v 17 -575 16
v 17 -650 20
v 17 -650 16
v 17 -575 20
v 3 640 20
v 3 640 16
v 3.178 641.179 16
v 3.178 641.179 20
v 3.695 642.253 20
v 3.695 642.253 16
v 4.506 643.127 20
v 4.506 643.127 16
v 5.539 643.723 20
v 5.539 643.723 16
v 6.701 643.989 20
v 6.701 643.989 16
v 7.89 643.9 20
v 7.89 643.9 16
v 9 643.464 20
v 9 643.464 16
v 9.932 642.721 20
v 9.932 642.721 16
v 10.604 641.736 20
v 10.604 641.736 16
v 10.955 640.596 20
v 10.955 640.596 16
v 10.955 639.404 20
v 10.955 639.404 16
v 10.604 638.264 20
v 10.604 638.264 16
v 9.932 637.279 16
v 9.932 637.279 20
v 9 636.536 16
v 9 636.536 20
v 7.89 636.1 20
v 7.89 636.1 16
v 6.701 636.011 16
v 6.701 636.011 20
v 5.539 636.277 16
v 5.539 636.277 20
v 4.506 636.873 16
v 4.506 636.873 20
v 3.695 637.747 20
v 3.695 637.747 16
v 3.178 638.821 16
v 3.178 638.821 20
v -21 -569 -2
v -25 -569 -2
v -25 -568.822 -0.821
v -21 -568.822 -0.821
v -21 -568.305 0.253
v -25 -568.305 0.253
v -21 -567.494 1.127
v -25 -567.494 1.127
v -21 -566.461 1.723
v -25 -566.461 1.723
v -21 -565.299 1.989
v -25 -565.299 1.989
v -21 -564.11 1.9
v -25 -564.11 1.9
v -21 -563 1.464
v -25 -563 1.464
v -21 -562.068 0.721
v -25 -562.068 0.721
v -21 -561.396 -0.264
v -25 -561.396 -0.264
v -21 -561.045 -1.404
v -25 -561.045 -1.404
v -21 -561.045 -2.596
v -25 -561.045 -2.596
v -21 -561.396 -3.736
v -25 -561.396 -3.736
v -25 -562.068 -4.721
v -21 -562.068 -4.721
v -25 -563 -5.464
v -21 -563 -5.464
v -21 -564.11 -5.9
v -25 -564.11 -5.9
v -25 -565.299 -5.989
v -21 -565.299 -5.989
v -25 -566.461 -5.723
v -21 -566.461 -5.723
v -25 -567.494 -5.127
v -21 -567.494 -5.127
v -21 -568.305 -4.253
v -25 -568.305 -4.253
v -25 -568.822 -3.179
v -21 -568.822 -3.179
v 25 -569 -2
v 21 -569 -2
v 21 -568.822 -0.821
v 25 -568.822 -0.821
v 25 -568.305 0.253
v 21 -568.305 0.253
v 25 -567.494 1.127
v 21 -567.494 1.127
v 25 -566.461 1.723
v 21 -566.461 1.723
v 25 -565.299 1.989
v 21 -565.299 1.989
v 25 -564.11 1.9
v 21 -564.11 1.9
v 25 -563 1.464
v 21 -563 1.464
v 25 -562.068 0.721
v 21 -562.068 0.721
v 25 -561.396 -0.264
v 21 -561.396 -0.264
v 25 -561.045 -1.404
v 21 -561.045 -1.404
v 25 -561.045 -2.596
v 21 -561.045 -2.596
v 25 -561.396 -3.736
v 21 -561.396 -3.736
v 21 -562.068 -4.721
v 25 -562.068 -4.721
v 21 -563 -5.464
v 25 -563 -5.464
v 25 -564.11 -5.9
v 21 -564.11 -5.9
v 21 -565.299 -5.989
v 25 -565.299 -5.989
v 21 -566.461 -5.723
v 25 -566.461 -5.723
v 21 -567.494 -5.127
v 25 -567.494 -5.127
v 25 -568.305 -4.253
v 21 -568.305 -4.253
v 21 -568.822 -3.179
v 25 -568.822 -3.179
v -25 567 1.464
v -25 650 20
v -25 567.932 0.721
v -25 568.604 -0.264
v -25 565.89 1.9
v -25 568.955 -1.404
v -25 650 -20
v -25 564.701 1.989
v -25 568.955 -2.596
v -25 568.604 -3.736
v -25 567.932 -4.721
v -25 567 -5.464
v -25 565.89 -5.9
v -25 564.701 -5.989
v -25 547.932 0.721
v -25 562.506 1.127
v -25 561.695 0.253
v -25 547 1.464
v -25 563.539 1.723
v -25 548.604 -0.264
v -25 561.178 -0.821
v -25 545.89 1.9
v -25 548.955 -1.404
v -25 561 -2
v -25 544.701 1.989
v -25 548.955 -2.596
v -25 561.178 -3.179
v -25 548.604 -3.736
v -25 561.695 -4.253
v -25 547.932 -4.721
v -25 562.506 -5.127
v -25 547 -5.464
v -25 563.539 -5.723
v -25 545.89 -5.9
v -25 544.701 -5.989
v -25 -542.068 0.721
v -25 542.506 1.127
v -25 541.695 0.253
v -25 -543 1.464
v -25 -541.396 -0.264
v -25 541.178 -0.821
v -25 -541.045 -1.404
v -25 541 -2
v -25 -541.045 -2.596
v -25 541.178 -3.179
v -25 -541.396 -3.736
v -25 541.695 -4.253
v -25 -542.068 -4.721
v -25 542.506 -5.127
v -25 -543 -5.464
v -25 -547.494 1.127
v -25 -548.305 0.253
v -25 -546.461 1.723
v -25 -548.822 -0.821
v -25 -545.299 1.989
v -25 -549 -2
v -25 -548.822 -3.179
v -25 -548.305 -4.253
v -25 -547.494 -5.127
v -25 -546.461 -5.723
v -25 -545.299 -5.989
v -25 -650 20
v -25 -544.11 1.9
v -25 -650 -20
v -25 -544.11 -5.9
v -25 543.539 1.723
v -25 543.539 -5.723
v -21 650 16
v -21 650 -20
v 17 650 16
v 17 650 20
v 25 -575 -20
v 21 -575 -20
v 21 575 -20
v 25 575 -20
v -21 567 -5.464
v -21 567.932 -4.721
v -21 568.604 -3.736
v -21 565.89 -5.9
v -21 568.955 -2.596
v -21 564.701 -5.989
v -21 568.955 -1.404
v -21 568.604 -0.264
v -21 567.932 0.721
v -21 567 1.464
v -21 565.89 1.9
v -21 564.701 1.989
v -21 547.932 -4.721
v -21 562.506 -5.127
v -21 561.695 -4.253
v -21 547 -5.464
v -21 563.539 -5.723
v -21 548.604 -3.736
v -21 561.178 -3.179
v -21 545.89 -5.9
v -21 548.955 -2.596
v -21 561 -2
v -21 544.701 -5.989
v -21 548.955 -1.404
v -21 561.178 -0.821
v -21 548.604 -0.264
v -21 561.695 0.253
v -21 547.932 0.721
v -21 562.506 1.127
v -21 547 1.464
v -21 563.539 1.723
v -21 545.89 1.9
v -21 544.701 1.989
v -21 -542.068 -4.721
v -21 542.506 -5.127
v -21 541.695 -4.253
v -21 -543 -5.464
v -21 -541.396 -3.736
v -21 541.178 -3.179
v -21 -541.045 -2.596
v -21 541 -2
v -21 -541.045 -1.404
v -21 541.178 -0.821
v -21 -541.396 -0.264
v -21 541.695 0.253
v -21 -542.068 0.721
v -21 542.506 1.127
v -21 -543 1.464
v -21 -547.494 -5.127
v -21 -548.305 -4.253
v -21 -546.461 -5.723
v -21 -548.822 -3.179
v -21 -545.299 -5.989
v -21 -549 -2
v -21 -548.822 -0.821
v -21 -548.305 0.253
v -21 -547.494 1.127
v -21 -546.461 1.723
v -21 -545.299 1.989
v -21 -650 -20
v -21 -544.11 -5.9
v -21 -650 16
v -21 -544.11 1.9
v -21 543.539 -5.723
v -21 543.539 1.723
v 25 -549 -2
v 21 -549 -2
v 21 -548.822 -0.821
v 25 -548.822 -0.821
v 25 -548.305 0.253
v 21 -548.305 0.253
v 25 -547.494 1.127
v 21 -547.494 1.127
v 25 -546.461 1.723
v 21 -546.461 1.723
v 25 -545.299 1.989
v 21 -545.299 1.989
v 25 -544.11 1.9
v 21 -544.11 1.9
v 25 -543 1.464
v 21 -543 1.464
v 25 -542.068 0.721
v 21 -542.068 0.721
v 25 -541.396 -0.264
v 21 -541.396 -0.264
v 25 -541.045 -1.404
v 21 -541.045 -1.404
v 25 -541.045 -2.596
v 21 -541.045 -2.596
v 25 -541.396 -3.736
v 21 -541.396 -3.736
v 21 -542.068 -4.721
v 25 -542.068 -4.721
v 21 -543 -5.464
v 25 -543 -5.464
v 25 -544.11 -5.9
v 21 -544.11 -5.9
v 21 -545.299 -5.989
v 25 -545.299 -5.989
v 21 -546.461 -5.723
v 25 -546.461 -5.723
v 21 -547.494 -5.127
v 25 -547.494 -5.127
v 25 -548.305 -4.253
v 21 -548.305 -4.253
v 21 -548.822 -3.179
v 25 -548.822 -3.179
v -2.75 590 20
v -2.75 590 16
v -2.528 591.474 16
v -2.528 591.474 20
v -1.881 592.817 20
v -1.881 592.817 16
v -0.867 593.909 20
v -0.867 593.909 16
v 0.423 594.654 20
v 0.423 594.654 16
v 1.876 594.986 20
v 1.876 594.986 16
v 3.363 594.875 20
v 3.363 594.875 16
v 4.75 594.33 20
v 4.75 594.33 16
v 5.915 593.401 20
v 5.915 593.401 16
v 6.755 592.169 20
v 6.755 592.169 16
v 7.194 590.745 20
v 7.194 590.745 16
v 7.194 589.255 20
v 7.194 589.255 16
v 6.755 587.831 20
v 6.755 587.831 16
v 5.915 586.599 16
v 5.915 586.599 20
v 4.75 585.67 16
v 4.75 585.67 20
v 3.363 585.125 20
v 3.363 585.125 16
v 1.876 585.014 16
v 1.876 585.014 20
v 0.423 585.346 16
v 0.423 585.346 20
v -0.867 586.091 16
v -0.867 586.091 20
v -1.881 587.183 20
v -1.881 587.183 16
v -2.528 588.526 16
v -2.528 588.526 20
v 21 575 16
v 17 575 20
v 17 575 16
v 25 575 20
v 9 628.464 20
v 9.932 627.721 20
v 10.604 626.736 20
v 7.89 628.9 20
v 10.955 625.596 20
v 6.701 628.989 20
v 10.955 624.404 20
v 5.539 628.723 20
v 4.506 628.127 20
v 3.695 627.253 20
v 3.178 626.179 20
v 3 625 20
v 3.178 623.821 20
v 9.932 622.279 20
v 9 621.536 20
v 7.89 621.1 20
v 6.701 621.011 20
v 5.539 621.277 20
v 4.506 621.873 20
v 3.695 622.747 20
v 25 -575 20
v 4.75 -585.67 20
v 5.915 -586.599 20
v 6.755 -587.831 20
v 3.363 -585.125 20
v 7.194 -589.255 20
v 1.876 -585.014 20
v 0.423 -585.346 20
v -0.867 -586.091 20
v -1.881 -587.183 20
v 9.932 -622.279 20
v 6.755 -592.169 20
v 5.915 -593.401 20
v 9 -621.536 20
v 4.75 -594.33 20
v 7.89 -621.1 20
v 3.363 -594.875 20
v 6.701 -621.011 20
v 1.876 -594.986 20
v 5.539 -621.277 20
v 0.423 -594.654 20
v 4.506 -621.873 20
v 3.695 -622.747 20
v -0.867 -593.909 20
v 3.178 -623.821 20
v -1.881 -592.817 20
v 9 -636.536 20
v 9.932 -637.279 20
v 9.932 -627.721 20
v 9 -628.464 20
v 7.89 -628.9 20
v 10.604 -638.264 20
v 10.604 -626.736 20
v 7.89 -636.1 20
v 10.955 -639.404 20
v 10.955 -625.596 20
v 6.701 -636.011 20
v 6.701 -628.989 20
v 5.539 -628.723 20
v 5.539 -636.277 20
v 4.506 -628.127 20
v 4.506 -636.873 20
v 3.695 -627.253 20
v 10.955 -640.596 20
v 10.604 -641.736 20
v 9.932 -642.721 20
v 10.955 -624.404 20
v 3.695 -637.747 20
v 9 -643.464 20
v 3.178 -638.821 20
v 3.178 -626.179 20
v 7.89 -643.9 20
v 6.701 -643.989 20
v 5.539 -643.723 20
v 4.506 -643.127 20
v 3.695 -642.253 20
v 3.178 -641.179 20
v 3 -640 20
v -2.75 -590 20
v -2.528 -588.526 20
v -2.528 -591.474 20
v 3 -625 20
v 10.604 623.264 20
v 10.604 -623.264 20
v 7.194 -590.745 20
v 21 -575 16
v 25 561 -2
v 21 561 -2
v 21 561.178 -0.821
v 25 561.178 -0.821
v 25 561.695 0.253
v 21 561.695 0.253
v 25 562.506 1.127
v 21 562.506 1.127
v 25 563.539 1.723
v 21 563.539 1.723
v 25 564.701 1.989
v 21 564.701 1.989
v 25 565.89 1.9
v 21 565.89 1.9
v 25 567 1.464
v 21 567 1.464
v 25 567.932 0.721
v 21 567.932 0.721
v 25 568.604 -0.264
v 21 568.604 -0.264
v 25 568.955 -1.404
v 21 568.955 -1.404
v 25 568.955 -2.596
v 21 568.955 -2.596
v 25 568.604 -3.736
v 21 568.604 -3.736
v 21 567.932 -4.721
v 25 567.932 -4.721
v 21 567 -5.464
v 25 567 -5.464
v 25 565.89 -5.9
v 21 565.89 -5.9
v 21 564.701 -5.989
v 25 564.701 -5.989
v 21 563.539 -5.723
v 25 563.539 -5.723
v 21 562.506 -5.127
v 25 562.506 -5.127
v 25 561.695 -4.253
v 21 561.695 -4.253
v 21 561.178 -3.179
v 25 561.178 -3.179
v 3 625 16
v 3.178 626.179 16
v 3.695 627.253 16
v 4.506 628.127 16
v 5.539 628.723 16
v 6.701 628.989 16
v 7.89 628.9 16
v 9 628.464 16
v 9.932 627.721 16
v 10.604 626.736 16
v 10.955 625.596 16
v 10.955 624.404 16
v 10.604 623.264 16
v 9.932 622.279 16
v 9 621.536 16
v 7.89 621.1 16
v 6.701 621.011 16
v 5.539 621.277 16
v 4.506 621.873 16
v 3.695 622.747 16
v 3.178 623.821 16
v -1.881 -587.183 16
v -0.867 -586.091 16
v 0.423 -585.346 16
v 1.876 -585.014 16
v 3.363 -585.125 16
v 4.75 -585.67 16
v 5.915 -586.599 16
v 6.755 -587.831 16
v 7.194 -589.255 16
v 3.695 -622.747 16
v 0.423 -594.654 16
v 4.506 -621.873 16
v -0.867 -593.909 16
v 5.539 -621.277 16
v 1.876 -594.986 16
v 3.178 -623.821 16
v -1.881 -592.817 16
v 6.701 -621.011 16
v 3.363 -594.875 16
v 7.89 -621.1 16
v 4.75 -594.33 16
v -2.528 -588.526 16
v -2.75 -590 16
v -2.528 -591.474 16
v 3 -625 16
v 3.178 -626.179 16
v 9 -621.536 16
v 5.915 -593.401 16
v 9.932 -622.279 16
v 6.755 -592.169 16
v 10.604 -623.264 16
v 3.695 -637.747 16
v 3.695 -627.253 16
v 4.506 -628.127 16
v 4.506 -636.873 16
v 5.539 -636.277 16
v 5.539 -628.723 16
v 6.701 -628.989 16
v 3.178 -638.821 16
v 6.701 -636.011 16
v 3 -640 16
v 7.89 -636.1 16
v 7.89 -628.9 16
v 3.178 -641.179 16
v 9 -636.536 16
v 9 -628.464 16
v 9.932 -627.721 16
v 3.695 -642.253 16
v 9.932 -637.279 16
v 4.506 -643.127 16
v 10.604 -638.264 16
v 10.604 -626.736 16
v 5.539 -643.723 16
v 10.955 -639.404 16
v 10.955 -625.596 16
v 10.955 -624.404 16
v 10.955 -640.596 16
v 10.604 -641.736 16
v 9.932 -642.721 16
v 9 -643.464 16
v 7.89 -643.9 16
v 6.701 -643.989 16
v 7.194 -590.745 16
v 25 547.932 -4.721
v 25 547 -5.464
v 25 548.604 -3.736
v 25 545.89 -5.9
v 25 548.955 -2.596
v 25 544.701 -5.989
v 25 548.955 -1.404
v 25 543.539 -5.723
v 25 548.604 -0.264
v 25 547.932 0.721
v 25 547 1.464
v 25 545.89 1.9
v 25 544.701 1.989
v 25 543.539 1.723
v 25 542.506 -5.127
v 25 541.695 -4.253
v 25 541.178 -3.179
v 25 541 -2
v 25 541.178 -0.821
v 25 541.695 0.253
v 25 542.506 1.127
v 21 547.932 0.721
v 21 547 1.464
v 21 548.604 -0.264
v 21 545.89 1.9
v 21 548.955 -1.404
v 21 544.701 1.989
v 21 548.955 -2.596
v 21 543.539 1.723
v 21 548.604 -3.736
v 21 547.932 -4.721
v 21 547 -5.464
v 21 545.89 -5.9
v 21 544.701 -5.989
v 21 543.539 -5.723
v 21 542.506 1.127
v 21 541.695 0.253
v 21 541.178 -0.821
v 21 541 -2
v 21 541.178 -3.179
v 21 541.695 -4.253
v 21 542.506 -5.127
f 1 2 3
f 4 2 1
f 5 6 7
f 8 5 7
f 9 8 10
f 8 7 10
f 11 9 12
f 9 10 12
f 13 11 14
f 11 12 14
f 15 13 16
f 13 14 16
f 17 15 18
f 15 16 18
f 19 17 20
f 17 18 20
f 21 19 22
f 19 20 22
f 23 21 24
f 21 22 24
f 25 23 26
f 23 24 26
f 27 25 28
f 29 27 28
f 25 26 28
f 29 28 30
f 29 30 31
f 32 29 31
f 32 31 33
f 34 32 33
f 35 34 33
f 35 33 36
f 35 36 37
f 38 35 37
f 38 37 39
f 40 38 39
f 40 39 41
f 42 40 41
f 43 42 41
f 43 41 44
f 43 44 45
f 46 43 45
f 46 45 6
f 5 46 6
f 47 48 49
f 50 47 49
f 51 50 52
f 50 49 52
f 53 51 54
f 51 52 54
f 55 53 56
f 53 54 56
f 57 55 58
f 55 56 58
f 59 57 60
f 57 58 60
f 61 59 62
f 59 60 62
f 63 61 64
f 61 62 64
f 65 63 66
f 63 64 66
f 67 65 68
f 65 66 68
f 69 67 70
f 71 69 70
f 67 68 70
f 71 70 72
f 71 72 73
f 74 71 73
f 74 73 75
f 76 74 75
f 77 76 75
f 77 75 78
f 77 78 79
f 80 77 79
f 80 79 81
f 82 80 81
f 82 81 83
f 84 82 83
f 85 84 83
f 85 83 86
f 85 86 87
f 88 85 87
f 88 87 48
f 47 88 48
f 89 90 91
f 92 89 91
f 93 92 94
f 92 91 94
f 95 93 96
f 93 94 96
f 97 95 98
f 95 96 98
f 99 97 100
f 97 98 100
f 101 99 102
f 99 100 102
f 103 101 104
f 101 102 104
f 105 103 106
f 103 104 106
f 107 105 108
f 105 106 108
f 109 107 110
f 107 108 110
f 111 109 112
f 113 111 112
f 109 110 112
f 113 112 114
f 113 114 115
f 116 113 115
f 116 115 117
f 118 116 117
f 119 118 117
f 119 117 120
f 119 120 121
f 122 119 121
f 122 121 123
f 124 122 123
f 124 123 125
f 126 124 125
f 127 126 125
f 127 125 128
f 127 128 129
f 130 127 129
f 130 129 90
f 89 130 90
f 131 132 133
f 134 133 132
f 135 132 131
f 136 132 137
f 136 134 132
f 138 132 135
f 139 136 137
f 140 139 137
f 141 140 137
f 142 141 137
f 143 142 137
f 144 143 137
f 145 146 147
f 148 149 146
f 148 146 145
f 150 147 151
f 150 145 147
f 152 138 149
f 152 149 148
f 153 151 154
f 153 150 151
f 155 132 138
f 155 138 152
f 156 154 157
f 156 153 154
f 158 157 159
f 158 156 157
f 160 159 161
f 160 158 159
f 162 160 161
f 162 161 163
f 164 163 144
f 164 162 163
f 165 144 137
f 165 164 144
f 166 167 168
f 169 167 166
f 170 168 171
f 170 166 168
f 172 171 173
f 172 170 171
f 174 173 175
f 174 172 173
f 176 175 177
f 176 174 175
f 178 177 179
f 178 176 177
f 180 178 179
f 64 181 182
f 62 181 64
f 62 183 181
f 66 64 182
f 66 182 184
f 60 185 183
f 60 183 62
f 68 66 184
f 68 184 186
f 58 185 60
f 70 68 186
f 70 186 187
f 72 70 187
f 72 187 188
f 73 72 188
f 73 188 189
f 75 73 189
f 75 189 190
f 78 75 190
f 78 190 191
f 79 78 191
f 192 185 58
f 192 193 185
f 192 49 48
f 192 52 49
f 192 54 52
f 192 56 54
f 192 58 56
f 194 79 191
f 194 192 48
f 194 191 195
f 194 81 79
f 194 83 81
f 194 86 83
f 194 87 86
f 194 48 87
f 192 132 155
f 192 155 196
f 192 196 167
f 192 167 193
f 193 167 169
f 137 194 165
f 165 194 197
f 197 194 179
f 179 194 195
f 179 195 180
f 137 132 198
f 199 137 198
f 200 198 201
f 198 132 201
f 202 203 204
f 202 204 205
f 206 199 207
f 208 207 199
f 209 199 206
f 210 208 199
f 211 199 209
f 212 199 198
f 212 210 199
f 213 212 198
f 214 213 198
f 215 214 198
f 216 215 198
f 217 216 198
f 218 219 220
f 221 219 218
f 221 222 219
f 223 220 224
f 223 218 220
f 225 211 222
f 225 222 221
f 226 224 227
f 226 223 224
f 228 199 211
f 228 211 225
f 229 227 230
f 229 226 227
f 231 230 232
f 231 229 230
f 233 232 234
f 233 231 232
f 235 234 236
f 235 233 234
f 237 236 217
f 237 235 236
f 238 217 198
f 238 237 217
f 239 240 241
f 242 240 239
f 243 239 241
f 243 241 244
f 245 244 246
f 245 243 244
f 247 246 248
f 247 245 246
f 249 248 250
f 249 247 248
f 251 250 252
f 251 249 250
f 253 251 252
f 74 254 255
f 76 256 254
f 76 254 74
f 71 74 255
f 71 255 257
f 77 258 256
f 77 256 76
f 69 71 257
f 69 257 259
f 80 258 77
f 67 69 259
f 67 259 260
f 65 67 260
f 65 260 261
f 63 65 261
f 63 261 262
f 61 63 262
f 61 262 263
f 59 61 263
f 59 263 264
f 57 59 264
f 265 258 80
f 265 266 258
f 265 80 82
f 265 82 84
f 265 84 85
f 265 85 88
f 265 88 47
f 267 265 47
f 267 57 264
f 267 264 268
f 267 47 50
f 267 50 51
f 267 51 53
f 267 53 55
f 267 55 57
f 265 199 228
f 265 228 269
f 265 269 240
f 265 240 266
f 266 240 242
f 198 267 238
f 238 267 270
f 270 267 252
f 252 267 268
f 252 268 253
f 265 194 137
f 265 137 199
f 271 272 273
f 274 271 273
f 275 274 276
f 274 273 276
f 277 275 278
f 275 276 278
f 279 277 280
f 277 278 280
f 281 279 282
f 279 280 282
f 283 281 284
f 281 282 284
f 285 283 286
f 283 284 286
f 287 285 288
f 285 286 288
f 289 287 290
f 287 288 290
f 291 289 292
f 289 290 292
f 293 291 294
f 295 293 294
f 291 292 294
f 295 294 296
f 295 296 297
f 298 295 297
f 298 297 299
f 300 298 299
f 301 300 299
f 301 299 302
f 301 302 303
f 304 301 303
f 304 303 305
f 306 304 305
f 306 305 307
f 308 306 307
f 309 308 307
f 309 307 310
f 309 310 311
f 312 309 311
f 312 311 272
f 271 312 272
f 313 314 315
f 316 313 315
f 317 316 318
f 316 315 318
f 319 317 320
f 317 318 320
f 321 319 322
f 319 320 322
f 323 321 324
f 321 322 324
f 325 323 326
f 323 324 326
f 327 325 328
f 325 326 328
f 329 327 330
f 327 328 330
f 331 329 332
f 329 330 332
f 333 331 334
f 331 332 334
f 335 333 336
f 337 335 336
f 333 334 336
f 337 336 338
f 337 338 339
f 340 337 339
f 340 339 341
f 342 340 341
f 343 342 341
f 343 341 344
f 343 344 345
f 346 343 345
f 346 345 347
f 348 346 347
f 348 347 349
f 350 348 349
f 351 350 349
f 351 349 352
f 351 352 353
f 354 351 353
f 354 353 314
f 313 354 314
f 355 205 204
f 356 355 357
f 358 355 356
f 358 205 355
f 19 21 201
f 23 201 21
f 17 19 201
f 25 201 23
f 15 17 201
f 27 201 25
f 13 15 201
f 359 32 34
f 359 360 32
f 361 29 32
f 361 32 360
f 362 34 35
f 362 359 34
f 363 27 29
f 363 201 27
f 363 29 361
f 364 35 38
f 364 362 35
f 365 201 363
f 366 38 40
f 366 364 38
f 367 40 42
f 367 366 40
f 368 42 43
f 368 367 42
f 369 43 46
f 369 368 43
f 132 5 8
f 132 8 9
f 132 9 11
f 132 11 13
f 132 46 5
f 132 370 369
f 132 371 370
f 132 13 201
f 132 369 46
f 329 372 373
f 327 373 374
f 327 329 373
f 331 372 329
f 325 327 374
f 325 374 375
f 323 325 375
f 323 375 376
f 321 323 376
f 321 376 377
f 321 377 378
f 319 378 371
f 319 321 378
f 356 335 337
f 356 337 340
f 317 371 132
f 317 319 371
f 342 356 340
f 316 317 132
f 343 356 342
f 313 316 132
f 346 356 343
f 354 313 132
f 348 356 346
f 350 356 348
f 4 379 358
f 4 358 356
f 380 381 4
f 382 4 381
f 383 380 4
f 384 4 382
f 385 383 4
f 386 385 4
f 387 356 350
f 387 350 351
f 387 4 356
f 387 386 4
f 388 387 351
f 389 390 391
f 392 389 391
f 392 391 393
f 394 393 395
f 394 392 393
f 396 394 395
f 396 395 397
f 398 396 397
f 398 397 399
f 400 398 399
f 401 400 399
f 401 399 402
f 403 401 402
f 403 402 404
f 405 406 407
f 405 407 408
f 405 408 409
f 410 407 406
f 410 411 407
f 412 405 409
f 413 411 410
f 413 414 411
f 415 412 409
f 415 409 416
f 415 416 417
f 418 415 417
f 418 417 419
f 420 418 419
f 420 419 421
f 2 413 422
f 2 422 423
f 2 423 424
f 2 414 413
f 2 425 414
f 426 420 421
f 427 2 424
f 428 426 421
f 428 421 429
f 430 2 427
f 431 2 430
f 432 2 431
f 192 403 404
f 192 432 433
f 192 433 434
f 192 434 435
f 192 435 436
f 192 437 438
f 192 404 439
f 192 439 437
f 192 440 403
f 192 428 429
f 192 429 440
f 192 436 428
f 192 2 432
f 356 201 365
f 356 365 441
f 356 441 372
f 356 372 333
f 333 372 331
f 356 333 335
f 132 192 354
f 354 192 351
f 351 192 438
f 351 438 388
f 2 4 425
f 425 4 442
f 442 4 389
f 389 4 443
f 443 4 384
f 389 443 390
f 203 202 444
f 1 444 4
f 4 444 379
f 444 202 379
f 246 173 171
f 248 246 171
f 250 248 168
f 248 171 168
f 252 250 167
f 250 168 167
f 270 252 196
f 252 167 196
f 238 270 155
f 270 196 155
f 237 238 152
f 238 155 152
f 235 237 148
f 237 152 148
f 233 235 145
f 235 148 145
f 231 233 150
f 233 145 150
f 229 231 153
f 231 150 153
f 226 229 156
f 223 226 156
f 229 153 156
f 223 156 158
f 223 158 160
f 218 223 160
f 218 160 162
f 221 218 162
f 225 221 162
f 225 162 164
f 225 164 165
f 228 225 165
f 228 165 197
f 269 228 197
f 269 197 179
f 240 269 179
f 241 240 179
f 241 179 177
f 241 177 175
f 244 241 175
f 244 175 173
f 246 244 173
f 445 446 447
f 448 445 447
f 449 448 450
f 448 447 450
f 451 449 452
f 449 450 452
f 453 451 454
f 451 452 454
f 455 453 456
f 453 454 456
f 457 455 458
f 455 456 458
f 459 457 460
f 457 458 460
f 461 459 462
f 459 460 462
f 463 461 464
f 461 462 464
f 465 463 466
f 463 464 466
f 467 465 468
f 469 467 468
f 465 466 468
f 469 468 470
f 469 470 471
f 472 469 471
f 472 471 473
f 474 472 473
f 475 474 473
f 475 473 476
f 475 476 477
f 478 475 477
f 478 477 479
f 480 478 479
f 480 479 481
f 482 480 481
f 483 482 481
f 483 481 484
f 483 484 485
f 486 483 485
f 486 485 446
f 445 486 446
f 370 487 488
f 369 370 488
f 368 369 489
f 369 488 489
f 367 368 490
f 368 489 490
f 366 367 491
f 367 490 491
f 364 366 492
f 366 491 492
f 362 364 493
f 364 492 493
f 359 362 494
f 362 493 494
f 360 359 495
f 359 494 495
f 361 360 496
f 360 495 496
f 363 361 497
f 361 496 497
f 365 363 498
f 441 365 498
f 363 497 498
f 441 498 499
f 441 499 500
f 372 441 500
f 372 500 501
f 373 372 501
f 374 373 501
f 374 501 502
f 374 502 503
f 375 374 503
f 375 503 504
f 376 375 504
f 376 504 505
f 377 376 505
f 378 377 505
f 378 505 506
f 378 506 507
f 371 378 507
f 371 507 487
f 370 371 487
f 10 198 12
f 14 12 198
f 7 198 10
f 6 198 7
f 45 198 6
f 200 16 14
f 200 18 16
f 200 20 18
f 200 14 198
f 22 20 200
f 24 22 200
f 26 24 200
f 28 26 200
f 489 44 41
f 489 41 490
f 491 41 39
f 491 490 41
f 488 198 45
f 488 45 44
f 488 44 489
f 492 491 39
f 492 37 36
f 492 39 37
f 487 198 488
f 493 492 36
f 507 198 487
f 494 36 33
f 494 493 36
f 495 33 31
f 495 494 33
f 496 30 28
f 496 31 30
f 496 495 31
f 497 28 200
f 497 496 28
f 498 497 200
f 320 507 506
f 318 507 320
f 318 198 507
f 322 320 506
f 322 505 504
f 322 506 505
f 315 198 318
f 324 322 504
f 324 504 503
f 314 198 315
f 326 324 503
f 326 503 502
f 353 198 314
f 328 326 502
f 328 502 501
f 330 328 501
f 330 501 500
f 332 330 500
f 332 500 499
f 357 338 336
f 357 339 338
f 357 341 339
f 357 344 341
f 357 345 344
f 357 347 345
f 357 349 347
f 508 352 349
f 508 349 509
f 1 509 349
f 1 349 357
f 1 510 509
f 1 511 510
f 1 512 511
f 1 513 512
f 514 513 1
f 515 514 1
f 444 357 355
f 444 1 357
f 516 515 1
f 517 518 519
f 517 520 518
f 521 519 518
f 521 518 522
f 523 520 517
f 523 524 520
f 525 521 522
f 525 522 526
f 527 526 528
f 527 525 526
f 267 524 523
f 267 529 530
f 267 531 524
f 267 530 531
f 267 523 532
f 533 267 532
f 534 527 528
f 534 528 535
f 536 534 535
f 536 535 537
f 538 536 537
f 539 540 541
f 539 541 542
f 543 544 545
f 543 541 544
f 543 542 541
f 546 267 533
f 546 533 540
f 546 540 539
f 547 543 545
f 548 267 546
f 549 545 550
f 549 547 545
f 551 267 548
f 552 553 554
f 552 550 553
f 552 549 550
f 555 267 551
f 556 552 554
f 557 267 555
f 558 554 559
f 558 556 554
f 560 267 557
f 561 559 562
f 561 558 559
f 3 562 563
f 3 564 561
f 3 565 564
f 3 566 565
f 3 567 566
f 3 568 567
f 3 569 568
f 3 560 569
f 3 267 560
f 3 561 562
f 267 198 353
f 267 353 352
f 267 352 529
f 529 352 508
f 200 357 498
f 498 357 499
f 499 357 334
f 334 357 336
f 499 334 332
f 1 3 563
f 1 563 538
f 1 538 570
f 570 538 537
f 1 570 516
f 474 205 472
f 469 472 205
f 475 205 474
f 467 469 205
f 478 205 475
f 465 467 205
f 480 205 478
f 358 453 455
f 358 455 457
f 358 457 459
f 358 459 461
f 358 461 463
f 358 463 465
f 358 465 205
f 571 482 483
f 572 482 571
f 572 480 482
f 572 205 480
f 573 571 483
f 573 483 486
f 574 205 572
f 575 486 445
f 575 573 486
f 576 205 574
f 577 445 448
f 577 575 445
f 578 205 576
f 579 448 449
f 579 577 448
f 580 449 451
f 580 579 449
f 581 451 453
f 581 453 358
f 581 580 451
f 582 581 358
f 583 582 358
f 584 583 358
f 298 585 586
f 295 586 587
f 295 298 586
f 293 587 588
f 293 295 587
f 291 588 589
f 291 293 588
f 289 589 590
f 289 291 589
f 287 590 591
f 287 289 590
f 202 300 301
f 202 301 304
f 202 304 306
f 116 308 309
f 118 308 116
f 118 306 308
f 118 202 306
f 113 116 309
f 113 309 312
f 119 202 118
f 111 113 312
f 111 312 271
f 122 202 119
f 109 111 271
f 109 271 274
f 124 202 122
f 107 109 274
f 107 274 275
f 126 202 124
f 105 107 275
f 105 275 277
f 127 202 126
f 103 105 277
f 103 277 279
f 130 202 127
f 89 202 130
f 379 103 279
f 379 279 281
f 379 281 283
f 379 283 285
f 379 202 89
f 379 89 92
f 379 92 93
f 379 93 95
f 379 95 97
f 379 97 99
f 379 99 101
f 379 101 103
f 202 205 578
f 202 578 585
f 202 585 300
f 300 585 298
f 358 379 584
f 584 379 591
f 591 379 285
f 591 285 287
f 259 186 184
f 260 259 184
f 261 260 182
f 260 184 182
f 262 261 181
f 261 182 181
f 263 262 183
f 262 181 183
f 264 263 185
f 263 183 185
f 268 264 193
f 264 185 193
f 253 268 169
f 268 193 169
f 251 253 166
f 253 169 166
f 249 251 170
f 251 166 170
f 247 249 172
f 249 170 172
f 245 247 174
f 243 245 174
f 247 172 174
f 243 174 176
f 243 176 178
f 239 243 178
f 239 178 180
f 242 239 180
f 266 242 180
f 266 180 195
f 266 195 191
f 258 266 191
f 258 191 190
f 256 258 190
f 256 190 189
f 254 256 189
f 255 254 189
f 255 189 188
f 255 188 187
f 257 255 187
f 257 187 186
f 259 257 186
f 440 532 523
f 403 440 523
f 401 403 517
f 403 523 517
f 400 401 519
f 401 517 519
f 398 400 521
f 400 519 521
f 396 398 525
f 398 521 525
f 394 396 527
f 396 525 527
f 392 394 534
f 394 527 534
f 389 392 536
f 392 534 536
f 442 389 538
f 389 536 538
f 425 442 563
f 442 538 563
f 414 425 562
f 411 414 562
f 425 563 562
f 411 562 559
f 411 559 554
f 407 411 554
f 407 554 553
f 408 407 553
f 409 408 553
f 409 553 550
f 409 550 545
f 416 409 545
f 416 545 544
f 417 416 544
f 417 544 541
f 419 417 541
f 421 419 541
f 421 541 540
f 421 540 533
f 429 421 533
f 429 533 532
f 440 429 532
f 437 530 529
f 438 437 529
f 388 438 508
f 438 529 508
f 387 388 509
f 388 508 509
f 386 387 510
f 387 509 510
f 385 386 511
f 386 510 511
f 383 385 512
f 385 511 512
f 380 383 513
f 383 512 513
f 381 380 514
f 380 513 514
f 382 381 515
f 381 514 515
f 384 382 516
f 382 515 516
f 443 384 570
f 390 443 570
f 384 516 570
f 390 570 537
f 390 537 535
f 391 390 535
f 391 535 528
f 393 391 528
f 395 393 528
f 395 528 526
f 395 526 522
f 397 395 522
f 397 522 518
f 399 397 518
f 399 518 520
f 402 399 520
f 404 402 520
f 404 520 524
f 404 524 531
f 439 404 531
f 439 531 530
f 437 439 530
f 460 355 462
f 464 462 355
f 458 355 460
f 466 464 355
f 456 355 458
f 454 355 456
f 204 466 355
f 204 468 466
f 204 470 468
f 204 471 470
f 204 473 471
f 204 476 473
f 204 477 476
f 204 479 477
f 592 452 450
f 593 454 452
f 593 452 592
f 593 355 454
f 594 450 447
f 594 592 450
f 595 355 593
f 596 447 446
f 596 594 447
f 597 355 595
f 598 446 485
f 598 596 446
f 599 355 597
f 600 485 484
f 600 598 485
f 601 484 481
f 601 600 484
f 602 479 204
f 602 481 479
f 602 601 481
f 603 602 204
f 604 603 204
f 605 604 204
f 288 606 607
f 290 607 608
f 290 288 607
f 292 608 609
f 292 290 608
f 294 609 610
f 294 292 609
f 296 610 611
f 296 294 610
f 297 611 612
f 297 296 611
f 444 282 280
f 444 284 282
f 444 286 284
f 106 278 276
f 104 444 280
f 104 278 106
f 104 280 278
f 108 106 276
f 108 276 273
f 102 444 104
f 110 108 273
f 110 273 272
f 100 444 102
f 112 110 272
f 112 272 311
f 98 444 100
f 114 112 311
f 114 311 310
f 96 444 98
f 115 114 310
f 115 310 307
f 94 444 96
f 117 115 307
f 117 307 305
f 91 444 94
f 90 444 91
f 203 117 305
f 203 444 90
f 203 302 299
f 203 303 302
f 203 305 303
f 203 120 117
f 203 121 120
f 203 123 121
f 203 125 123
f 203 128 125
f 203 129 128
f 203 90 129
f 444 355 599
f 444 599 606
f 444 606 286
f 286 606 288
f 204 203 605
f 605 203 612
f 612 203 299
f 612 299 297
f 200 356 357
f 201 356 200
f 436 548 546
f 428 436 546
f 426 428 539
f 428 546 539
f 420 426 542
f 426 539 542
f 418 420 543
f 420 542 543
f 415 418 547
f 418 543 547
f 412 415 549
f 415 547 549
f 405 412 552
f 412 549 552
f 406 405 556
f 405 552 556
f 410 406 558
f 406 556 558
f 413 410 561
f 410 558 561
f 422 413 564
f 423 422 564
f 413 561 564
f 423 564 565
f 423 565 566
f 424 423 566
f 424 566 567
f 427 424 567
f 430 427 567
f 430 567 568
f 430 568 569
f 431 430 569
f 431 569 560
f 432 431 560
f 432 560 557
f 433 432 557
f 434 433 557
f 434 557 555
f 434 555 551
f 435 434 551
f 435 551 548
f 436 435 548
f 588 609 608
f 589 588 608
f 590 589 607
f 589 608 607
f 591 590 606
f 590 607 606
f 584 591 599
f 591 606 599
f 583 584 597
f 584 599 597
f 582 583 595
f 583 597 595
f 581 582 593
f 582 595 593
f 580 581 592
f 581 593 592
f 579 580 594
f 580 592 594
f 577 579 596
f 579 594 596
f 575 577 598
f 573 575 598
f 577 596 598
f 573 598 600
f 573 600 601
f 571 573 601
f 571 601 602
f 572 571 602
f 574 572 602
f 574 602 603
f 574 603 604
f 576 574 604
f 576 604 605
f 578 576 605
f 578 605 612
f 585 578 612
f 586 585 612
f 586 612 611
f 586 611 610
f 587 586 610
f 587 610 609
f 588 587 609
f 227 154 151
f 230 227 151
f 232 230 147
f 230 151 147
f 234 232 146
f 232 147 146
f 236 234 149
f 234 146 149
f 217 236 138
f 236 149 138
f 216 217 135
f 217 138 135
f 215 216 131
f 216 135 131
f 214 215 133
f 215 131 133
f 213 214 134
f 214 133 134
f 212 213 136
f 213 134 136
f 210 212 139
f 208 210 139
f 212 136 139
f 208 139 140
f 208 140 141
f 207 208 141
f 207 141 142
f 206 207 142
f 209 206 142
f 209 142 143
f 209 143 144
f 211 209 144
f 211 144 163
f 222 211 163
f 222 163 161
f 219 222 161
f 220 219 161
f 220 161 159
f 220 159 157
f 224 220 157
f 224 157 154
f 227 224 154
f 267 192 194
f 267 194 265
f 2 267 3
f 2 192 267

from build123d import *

# Parameters (mm, degrees)
F1_DEPTH   = 650
F2_W       = 75
F2_H       = 40
F3_DEPTH   = 8
F5_D       = 8
F5_ON_F2_D = 8
F6_D       = 10


with BuildPart() as f1:
    # F0 (on Front) → F1 (new body, symmetric)
    with BuildSketch(Plane.XZ):
        Polygon((21, -20), (25, -20), (25, 20), (-25, 20), (-25, -20), (-21, -20), (-21, 16), (21, 16), align=None)
    extrude(amount=F1_DEPTH, both=True)

    # F2 (on face) → F3 (cut)
    with BuildSketch(Plane.YZ.offset(25)):
        with Locations((-612.5, 0)):
            Rectangle(F2_W, F2_H)
        with Locations((612.5, 0)):
            Rectangle(F2_W, F2_H)
    extrude(amount=-F3_DEPTH, mode=Mode.SUBTRACT)

    # F5 (through all)
    with Locations(Plane.XY.offset(20)):
        with Locations((7, -625), (7, -640), (7, 640), (7, 625)):
            Hole(F5_D / 2)

    # F5 on F2 (through all)
    with Locations(Plane.YZ.offset(25)):
        with Locations((-565, -2), (-545, -2), (565, -2), (545, -2)):
            Hole(F5_ON_F2_D / 2)

    # F6 (through all)
    with Locations(Plane.XY.offset(20)):
        with Locations((2.25, -590), (2.25, 590)):
            Hole(F6_D / 2)


solid = f1.part
